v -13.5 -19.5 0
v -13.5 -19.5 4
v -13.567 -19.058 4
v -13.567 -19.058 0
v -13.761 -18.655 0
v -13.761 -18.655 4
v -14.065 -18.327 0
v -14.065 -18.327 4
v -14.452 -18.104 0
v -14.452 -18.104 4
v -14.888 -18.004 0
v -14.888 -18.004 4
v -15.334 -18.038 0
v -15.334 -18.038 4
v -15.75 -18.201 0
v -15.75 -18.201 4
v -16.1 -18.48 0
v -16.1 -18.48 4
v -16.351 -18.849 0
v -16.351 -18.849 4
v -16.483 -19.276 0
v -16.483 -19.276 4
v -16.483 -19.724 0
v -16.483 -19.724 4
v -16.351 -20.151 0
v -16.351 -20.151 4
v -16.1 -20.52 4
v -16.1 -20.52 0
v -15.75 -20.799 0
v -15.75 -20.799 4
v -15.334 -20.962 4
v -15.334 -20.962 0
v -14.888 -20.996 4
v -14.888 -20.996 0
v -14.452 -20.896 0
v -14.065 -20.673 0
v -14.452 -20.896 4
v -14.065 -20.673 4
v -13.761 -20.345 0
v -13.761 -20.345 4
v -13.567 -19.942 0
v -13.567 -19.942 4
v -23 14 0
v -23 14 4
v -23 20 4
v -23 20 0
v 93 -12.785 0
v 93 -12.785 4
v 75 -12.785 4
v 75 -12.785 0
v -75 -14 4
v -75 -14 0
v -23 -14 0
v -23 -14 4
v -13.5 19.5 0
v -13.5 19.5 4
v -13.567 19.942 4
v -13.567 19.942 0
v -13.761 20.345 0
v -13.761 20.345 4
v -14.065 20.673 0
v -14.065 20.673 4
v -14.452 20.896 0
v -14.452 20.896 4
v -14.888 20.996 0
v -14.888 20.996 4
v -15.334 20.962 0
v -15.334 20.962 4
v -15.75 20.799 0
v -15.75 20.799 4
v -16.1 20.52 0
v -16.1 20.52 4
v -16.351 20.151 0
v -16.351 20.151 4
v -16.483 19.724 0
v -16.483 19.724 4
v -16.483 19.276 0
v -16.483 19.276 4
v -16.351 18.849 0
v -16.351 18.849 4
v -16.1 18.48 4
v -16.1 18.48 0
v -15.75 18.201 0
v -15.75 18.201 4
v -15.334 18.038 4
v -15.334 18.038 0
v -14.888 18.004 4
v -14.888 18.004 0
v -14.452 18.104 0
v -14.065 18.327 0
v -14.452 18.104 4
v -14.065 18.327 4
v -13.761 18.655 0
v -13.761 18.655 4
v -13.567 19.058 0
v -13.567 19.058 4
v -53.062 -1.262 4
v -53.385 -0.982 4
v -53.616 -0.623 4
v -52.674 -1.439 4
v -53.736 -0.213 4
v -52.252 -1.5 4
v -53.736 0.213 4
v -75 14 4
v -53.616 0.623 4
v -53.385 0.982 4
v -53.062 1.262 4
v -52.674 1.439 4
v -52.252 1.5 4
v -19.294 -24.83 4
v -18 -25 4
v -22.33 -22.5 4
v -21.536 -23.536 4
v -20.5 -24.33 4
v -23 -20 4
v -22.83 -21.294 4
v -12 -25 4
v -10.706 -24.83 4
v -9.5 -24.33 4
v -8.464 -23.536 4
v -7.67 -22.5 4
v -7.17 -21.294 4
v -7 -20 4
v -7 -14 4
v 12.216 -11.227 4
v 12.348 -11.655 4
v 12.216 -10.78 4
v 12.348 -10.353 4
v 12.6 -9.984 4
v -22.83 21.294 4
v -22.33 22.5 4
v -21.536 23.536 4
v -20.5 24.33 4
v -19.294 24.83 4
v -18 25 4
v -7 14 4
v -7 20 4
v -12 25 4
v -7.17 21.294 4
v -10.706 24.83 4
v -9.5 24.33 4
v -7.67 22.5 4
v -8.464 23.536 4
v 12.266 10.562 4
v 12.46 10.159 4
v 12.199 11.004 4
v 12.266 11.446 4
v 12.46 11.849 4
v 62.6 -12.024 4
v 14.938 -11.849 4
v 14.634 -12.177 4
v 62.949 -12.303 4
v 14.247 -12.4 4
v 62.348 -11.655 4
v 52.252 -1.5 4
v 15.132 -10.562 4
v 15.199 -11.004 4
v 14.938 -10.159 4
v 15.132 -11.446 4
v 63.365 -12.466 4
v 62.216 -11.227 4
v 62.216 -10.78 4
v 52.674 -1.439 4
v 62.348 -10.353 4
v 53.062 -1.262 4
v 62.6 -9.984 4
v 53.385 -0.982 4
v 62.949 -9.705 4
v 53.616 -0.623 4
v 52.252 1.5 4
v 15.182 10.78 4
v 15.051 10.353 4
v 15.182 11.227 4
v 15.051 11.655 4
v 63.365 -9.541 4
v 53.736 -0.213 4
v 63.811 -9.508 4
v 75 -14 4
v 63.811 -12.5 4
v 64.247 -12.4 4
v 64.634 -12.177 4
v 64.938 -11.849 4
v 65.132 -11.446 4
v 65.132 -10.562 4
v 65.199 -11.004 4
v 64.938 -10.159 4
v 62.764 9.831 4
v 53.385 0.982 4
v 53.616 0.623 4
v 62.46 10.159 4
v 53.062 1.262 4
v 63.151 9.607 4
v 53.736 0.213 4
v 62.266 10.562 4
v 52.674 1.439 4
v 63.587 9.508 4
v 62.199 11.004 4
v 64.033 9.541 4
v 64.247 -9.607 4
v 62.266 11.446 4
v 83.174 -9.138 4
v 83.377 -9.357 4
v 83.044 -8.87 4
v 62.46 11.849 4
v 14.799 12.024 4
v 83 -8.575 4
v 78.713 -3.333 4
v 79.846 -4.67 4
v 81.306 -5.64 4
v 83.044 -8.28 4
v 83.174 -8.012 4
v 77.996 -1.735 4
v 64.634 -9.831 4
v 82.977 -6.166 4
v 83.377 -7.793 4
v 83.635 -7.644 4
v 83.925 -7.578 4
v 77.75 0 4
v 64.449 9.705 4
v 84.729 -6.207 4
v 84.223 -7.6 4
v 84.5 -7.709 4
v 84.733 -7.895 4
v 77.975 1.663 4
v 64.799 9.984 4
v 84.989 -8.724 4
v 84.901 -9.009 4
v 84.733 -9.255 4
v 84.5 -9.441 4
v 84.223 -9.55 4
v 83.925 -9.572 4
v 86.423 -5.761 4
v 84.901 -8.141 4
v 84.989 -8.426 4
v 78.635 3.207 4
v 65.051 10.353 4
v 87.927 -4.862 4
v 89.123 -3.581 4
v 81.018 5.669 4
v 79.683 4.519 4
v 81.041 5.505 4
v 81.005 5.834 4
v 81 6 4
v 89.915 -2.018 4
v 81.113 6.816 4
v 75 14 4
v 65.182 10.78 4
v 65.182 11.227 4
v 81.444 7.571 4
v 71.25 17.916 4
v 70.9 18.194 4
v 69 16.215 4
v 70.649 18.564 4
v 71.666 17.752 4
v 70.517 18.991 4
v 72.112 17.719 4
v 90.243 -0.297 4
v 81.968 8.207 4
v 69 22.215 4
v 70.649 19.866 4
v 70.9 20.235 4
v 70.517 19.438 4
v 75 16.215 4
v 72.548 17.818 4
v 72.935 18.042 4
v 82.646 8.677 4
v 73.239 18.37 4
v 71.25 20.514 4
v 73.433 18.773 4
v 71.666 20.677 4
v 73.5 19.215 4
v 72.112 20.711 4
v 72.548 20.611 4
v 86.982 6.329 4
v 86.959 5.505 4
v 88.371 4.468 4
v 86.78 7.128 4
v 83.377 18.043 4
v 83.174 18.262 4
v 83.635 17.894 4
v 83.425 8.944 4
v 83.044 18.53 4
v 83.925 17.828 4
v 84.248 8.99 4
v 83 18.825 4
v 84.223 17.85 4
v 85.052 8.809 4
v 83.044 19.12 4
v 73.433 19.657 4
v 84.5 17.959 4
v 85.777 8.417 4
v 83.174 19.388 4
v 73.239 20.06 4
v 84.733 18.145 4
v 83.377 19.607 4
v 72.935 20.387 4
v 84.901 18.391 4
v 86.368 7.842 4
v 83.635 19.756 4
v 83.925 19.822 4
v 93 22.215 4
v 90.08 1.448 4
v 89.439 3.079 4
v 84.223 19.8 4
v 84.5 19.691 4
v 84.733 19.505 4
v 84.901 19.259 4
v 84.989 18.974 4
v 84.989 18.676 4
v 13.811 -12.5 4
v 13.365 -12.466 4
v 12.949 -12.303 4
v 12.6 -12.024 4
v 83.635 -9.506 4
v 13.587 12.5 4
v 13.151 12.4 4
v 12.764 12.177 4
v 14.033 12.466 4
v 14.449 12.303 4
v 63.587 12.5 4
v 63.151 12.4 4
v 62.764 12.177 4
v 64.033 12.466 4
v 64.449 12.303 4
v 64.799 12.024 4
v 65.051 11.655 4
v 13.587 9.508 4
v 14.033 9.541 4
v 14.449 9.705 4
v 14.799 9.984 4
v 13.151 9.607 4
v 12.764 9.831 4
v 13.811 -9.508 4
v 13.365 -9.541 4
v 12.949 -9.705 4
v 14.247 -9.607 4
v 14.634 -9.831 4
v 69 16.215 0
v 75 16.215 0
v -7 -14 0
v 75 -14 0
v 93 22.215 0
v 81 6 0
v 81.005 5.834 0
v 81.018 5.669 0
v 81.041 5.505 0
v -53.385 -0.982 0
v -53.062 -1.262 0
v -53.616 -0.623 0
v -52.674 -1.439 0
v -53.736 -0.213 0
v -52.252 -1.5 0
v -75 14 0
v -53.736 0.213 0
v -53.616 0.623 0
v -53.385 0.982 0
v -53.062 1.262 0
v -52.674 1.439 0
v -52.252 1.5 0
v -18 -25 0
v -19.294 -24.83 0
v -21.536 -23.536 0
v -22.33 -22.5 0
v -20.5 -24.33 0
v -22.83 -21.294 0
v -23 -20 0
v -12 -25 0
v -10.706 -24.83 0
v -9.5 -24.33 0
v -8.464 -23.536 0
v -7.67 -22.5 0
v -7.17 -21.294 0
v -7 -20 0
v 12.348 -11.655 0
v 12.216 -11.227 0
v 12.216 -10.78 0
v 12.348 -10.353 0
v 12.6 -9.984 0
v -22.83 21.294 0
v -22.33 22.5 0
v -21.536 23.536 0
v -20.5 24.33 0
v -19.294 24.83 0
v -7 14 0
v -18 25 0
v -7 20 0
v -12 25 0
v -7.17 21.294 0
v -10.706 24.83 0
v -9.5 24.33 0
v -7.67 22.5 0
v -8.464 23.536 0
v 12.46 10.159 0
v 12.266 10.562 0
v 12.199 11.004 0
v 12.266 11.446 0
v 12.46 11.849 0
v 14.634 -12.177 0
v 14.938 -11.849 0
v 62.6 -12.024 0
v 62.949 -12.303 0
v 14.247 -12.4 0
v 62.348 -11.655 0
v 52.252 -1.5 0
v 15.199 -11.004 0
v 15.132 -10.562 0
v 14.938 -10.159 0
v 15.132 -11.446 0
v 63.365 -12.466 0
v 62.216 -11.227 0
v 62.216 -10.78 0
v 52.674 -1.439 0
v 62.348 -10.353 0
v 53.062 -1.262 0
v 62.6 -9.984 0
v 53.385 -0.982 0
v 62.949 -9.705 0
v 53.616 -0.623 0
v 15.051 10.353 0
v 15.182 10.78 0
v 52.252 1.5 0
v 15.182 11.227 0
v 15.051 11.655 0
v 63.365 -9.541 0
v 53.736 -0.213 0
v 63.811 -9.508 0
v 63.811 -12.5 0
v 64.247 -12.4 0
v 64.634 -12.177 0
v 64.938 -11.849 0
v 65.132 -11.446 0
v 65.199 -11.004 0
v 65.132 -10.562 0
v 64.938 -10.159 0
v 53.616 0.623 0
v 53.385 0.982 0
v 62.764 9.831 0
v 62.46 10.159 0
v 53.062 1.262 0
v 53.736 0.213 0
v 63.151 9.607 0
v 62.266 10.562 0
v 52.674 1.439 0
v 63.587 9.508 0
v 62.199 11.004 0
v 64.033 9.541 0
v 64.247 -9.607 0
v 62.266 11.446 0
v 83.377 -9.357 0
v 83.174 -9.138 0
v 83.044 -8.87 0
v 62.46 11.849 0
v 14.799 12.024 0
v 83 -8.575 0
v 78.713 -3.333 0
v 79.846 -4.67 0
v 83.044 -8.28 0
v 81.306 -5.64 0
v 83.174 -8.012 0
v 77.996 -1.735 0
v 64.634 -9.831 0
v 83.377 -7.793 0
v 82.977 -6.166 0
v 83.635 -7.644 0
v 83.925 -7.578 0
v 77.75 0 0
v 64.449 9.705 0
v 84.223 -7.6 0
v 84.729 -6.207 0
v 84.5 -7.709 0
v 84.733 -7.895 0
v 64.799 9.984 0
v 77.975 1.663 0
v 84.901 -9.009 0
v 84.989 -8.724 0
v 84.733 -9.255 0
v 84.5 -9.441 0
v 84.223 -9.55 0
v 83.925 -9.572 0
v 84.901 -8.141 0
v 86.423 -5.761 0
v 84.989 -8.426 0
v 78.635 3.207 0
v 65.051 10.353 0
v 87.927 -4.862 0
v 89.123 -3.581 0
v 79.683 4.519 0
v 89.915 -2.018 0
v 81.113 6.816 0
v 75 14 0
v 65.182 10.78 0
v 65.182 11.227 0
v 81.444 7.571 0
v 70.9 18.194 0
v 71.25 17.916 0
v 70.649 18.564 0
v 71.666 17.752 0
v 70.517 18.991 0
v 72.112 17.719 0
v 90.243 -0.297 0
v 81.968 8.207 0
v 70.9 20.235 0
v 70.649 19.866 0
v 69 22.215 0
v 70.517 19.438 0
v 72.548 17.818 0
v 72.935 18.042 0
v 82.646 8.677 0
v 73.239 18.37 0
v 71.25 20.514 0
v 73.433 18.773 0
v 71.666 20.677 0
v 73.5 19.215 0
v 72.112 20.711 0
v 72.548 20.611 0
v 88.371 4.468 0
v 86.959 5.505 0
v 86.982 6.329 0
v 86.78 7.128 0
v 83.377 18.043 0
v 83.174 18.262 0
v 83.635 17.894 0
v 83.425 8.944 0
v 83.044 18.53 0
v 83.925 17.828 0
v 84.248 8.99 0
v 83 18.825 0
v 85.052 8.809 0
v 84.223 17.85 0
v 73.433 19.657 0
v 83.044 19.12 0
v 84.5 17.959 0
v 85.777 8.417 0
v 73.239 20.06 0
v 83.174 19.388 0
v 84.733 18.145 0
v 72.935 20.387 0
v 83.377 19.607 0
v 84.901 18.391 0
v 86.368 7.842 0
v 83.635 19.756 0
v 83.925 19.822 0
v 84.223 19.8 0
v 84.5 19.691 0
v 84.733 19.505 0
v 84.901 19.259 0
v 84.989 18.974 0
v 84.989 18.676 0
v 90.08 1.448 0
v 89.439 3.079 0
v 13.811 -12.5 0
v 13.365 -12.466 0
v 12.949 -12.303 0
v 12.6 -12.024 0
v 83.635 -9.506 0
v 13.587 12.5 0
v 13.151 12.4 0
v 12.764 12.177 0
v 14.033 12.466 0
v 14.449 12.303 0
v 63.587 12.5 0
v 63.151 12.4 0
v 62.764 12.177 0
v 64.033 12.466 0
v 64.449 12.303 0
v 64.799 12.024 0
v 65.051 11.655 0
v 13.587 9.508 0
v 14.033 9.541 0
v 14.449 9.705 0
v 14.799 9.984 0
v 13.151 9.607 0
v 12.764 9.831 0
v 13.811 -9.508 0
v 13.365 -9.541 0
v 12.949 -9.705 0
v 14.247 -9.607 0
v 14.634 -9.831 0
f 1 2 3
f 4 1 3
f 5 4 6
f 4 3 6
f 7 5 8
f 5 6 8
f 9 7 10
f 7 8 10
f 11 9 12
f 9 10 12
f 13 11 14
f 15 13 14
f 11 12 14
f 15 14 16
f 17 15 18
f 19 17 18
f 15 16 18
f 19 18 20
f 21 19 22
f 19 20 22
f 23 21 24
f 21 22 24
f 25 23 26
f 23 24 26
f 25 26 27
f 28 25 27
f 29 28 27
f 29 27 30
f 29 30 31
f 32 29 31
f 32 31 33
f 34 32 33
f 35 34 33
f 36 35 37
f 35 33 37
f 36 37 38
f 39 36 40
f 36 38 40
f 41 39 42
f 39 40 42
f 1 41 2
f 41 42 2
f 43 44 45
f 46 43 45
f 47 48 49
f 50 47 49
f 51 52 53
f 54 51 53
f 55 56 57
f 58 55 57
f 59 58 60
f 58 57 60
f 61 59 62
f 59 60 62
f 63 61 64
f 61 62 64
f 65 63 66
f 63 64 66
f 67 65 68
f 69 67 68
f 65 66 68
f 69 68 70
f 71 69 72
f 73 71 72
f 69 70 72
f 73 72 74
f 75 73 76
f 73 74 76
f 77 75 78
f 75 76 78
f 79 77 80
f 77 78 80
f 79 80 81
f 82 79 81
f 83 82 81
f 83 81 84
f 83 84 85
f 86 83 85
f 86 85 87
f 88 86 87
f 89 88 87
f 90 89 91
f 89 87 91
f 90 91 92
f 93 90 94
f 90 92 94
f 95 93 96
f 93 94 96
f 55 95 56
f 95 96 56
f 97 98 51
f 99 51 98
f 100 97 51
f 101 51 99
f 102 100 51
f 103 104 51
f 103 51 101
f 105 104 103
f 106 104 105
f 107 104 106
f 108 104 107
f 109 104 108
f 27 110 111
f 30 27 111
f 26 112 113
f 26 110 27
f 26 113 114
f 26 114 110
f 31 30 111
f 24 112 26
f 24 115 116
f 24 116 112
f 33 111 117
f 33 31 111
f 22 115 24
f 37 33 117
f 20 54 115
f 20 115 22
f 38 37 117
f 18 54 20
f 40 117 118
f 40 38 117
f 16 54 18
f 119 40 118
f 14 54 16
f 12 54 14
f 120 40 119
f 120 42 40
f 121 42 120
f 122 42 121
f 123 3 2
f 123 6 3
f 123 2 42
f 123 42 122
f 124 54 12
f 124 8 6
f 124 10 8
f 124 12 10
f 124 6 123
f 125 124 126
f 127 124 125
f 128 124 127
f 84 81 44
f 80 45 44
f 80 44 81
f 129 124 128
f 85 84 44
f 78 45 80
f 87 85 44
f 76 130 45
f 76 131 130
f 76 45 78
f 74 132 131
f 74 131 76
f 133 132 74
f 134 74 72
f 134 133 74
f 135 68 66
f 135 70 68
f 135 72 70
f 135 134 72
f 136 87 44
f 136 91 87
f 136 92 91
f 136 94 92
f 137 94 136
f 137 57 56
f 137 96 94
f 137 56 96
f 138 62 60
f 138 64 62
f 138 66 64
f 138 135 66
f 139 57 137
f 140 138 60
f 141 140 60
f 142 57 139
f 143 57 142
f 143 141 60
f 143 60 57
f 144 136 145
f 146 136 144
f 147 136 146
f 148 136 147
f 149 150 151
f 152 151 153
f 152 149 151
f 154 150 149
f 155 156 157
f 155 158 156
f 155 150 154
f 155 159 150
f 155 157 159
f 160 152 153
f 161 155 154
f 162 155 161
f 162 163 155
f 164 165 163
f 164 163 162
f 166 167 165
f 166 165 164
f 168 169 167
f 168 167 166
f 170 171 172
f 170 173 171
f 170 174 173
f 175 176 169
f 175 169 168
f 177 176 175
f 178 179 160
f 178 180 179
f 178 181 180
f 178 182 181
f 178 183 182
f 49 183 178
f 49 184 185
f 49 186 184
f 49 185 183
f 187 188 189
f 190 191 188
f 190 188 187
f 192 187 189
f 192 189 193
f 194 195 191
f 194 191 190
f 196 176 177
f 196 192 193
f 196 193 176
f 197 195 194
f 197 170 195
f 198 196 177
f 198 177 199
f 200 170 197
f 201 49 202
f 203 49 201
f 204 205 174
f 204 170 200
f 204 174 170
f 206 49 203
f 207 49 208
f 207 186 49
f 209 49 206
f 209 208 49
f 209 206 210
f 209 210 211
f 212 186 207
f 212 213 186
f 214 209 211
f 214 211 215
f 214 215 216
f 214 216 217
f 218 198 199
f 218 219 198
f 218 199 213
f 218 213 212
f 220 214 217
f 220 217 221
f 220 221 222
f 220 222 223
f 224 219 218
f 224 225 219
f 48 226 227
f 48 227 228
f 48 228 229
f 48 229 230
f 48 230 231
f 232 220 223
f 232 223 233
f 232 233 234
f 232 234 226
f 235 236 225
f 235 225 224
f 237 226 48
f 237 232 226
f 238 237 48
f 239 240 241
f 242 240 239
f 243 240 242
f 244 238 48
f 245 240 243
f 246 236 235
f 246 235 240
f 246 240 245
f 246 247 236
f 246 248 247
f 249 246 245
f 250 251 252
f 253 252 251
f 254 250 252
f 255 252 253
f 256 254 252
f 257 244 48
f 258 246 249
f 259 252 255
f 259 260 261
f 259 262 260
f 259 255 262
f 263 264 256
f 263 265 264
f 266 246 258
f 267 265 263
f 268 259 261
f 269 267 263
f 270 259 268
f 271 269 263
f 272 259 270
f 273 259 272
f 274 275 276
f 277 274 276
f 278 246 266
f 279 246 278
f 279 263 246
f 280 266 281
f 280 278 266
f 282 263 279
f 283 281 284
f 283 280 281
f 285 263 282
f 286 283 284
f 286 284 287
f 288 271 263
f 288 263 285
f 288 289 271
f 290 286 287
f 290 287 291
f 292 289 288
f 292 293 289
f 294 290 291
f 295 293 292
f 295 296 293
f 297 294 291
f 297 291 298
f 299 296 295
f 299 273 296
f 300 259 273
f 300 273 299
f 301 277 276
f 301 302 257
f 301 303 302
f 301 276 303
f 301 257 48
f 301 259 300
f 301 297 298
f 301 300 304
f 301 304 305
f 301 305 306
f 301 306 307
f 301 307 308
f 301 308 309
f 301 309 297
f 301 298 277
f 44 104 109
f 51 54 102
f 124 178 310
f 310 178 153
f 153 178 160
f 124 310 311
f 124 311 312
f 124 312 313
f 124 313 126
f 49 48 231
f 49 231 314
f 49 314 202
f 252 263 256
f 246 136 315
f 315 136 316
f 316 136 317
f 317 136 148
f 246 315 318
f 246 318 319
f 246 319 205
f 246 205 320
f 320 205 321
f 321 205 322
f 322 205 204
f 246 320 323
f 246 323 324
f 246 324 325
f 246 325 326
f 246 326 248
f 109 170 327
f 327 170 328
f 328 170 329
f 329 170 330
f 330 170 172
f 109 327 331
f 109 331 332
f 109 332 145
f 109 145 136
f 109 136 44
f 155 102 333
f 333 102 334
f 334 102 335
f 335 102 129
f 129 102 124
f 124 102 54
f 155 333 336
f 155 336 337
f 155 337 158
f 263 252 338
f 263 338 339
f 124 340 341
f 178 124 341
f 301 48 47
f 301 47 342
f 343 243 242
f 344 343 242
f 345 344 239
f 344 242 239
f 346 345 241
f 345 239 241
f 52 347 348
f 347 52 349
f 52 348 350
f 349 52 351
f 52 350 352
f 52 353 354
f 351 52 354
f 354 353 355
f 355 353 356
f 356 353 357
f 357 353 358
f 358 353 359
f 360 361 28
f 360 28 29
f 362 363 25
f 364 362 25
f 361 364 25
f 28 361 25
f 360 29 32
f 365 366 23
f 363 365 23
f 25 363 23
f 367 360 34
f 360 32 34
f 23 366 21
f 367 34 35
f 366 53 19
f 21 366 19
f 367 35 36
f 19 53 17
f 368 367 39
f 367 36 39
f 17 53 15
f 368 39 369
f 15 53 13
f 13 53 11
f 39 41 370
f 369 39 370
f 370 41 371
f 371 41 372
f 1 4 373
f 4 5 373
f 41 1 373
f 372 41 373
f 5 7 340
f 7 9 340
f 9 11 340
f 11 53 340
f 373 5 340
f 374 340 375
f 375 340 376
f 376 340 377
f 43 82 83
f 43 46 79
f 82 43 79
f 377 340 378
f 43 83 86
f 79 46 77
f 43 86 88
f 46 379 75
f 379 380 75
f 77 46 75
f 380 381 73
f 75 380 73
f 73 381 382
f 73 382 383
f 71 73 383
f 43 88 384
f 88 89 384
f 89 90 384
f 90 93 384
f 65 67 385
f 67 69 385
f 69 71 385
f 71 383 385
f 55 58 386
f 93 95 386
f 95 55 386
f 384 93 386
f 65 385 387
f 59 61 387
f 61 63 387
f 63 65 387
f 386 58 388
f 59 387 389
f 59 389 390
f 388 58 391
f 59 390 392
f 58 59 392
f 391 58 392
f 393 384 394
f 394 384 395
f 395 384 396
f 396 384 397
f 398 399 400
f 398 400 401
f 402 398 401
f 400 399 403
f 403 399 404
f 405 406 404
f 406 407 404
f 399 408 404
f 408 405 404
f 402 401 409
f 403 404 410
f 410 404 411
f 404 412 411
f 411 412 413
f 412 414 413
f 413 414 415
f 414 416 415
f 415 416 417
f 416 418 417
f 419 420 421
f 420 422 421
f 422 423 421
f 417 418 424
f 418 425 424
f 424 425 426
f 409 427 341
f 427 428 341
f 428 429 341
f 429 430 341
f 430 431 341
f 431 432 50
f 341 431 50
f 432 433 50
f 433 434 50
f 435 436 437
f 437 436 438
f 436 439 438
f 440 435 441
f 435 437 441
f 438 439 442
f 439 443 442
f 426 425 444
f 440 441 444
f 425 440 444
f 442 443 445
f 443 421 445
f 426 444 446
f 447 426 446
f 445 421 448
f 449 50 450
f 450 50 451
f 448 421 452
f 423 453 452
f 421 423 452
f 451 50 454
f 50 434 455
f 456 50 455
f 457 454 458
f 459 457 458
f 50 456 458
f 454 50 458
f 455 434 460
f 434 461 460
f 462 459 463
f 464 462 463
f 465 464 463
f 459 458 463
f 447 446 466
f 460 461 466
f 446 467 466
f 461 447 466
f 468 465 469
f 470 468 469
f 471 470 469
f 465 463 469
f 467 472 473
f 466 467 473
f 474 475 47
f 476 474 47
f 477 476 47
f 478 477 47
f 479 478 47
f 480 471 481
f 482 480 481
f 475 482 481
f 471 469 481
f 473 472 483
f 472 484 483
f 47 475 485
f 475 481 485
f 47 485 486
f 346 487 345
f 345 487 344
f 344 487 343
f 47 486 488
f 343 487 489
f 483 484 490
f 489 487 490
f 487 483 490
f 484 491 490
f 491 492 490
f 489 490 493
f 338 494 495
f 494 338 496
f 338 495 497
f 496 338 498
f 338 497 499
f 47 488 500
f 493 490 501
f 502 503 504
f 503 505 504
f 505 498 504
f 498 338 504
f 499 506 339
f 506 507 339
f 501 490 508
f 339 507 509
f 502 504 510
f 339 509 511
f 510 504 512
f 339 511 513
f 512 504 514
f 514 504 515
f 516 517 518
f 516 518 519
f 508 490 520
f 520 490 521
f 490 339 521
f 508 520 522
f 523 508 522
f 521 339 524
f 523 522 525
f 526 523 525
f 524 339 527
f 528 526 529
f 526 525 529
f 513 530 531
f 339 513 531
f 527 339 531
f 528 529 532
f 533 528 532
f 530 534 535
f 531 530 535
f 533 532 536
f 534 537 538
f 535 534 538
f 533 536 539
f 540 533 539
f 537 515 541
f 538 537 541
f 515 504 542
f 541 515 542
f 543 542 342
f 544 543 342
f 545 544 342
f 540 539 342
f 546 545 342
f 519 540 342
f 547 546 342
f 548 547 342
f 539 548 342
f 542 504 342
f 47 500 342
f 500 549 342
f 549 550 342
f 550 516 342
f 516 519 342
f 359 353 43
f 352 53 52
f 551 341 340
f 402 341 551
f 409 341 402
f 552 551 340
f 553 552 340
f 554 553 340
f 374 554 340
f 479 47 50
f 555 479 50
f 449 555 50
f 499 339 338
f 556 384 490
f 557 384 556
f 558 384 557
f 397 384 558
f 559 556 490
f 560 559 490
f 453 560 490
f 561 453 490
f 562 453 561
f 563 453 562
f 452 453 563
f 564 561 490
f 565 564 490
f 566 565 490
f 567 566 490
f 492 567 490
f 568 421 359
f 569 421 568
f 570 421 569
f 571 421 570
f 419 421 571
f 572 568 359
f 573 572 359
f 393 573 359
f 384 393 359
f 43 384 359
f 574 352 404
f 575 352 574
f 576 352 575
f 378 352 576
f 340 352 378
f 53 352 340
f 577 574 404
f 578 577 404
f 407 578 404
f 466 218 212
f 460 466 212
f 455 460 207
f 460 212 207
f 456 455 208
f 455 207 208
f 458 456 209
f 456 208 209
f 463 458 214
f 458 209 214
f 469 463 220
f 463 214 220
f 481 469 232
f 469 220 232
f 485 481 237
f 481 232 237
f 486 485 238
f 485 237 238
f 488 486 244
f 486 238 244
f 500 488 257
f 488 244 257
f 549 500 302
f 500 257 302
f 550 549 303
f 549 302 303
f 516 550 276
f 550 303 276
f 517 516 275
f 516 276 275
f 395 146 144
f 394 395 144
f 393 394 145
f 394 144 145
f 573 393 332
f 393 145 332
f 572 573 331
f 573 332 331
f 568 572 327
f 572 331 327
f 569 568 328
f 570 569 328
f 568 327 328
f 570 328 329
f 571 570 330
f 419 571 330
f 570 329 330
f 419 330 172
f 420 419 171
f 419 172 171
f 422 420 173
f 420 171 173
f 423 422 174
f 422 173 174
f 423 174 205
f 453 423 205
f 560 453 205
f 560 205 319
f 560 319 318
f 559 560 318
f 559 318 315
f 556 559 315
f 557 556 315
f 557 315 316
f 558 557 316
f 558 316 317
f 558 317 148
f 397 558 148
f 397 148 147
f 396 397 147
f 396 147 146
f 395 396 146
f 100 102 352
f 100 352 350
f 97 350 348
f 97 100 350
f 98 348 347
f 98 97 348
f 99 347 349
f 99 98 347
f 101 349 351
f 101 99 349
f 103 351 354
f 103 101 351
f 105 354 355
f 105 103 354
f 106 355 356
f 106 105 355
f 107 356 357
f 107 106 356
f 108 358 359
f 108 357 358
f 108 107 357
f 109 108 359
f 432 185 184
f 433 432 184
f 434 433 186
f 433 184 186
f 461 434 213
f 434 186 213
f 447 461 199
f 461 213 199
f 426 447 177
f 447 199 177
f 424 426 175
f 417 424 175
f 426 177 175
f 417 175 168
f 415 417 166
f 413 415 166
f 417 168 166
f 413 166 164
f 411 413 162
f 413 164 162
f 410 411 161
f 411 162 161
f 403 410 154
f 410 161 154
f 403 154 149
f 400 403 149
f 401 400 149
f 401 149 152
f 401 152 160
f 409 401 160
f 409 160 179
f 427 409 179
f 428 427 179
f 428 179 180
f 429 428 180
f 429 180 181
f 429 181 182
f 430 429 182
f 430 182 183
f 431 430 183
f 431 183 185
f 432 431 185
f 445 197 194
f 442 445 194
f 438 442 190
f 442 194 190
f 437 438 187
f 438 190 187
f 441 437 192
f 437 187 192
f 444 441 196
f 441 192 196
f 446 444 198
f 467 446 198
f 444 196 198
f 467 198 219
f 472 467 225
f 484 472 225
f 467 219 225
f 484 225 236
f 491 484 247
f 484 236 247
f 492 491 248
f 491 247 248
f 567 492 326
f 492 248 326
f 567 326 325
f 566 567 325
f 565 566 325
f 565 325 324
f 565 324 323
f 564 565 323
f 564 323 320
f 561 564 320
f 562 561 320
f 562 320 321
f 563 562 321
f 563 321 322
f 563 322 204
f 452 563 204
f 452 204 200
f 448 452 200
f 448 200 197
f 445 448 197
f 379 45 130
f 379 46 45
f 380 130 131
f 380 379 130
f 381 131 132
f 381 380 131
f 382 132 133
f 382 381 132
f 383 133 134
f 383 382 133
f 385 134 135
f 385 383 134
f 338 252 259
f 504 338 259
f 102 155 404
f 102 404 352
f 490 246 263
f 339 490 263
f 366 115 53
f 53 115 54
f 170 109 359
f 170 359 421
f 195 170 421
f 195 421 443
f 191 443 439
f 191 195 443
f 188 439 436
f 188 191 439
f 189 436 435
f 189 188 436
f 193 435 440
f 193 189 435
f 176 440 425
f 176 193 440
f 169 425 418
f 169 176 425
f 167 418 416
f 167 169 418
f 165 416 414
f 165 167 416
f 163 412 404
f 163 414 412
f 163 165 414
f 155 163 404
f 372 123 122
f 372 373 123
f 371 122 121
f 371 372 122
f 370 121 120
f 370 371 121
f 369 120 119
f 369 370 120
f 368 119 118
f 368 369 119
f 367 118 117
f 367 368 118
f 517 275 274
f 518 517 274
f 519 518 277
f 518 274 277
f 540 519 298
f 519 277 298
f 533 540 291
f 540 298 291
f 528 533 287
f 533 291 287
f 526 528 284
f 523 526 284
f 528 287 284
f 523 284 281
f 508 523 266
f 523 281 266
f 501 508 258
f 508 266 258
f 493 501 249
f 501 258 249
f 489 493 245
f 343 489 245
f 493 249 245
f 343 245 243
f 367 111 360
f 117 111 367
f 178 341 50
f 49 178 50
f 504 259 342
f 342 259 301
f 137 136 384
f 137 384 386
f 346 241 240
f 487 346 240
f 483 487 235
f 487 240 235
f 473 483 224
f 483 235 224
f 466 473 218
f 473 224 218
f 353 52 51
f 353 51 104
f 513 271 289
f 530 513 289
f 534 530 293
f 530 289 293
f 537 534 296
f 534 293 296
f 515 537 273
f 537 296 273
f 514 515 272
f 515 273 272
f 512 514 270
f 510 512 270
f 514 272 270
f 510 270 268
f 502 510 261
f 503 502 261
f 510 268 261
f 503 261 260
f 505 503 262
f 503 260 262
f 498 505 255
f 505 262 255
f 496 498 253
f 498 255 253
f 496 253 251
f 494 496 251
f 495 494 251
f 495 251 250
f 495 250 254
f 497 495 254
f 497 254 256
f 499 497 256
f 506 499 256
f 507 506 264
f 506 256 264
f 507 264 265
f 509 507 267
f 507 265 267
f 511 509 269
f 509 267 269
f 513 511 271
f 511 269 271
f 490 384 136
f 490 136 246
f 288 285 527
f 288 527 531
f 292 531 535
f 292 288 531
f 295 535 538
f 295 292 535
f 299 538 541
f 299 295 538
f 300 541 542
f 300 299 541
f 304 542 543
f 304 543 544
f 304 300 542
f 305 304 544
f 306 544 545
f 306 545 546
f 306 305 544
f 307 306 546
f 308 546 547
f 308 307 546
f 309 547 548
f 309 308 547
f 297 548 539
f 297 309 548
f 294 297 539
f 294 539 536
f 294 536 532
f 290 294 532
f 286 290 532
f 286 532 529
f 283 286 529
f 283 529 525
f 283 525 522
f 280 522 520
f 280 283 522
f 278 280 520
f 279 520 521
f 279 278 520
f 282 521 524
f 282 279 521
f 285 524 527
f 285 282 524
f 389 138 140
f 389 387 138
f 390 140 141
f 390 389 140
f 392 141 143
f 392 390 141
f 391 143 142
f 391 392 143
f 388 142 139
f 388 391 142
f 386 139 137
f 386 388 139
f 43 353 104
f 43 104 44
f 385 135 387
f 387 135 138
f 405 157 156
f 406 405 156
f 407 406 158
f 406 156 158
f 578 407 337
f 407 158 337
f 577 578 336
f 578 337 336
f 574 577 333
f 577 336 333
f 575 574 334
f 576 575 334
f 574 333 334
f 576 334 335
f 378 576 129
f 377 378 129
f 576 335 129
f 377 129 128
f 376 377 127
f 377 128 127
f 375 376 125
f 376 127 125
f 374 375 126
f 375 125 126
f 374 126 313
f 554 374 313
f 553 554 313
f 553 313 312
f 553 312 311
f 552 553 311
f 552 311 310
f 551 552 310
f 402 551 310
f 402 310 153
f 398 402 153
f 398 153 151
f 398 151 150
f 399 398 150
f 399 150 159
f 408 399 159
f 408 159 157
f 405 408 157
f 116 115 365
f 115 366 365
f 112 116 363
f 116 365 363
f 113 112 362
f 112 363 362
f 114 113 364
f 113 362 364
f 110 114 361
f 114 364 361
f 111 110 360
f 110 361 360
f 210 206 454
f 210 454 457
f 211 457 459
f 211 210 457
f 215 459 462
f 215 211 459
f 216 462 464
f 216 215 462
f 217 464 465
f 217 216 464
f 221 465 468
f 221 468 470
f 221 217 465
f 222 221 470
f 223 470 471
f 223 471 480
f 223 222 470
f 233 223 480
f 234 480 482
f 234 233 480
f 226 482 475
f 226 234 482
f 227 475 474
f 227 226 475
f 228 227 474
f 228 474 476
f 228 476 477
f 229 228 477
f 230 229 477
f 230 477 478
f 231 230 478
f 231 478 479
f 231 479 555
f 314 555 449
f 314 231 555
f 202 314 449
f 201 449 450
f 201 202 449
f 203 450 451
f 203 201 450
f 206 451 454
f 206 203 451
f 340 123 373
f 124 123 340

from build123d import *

# Parameters (mm, degrees)
SKETCH_1_W          = 150
SKETCH_1_H          = 28
EXTRUDE_1_DEPTH     = 4
CUT_EXTRUDE_1_DEPTH = 77.40026178
SKETCH_4_R          = 1.5
CUT_EXTRUDE_2_DEPTH = 77.40026178
EXTRUDE_START       = -4
SKETCH_5_W          = 18
SKETCH_5_H          = 35
SKETCH_5_R          = 1
EXTRUDE_3_DEPTH     = 4
SKETCH_7_W          = 6
SKETCH_7_H          = 6
SKETCH_7_R          = 1.5
EXTRUDE_4_DEPTH     = 4
SKETCH_3_W          = 16
SKETCH_3_H          = 10
SKETCH_3_H_2        = 11
SKETCH_3_R          = 1.5
EXTRUDE_2_DEPTH     = 4
FILLET_1_R          = 5


with BuildPart() as part:
    # Эскиз1 → Бобышка-Вытянуть1 (new body)
    with BuildSketch(Plane.XY):
        Rectangle(SKETCH_1_W, SKETCH_1_H)
    extrude(amount=EXTRUDE_1_DEPTH)

    # Эскиз2 → Вырез-Вытянуть1 (cut, through all)
    with BuildSketch(Plane.XY.offset(4)):
        with BuildLine():
            Line((-52.251534571, 1.5), (52.251534571, 1.5))
            ThreePointArc((52.251534571, 1.5), (53.751534571, 0), (52.251534571, -1.5))
            Line((52.251534571, -1.5), (-52.251534571, -1.5))
            ThreePointArc((-52.251534571, -1.5), (-53.751534571, 0), (-52.251534571, 1.5))
        make_face()
    extrude(amount=-CUT_EXTRUDE_1_DEPTH, mode=Mode.SUBTRACT)

    # Эскиз4 → Вырез-Вытянуть2 (cut, through all)
    with BuildSketch(Plane.XY.offset(4)):
        with Locations((13.699103215, -11.003765504)):
            Circle(SKETCH_4_R)
        with Locations((63.699103215, -11.003765504)):
            Circle(SKETCH_4_R)
        with Locations(Location((63.699103215, 11.003765504, 0), (0, 0, 180))):
            Circle(SKETCH_4_R)
        with Locations(Location((13.699103215, 11.003765504, 0), (0, 0, 180))):
            Circle(SKETCH_4_R)
    extrude(amount=-CUT_EXTRUDE_2_DEPTH, mode=Mode.SUBTRACT)

    # Эскиз5 → Бобышка-Вытянуть3 (add)
    with BuildSketch(Plane(origin=(0, 0, 0), x_dir=(-1, 0, 0), z_dir=(0, 0, -1)).offset(EXTRUDE_START)):
        with Locations((-84, 4.714716343)):
            Rectangle(SKETCH_5_W, SKETCH_5_H)
        with Locations((-84, -8.575)):
            Circle(SKETCH_5_R, mode=Mode.SUBTRACT)
        with BuildLine():
            ThreePointArc((-81.041084454, 5.505208333), (-78.635499923, 3.206967246), (-77.75, 0))
            ThreePointArc((-77.75, 0), (-87.206967246, -5.364500077), (-86.958915546, 5.505208333))
            ThreePointArc((-86.958915546, 5.505208333), (-84.248247218, 8.989711243), (-81, 6))
            ThreePointArc((-81, 6), (-81.010288757, 5.751752782), (-81.041084454, 5.505208333))
        make_face(mode=Mode.SUBTRACT)
        with Locations((-84, 18.825)):
            Circle(SKETCH_5_R, mode=Mode.SUBTRACT)
    extrude(amount=EXTRUDE_3_DEPTH)

    # Эскиз7 → Бобышка-Вытянуть4 (add)
    with BuildSketch(Plane.XY.offset(4)):
        with Locations((72, 19.214716343)):
            Rectangle(SKETCH_7_W, SKETCH_7_H)
        with Locations((72, 19.214716343)):
            Circle(SKETCH_7_R, mode=Mode.SUBTRACT)
    extrude(amount=-EXTRUDE_4_DEPTH)

    # Эскиз3 → Бобышка-Вытянуть2 (add)
    # profile 1 of 4: a face of its own
    with BuildSketch(Plane.XY.offset(4)):
        with Locations((-15, 9)):
            Rectangle(SKETCH_3_W, SKETCH_3_H)
    # profile 2 of 4: a face of its own
    with BuildSketch(Plane.XY.offset(4)):
        with Locations((-15, 19.5)):
            Rectangle(SKETCH_3_W, SKETCH_3_H_2)
        with Locations((-15, 19.5)):
            Circle(SKETCH_3_R, mode=Mode.SUBTRACT)
    # profile 3 of 4: a face of its own
    with BuildSketch(Plane.XY.offset(4)):
        with Locations((-15, -9)):
            Rectangle(SKETCH_3_W, SKETCH_3_H)
    # profile 4 of 4: a face of its own
    with BuildSketch(Plane.XY.offset(4)):
        with Locations((-15, -19.5)):
            Rectangle(SKETCH_3_W, SKETCH_3_H_2)
        with Locations((-15, -19.5)):
            Circle(SKETCH_3_R, mode=Mode.SUBTRACT)
    extrude(amount=-EXTRUDE_2_DEPTH)

    # Скругление1
    fillet_1_edges = [part.edges().sort_by_distance(p)[0] for p in [
        (-23, -25, 2),
        (-7, -25, 2),
        (-7, 25, 2),
        (-23, 25, 2),
    ]]
    fillet(fillet_1_edges, radius=FILLET_1_R)


solid = part.part
